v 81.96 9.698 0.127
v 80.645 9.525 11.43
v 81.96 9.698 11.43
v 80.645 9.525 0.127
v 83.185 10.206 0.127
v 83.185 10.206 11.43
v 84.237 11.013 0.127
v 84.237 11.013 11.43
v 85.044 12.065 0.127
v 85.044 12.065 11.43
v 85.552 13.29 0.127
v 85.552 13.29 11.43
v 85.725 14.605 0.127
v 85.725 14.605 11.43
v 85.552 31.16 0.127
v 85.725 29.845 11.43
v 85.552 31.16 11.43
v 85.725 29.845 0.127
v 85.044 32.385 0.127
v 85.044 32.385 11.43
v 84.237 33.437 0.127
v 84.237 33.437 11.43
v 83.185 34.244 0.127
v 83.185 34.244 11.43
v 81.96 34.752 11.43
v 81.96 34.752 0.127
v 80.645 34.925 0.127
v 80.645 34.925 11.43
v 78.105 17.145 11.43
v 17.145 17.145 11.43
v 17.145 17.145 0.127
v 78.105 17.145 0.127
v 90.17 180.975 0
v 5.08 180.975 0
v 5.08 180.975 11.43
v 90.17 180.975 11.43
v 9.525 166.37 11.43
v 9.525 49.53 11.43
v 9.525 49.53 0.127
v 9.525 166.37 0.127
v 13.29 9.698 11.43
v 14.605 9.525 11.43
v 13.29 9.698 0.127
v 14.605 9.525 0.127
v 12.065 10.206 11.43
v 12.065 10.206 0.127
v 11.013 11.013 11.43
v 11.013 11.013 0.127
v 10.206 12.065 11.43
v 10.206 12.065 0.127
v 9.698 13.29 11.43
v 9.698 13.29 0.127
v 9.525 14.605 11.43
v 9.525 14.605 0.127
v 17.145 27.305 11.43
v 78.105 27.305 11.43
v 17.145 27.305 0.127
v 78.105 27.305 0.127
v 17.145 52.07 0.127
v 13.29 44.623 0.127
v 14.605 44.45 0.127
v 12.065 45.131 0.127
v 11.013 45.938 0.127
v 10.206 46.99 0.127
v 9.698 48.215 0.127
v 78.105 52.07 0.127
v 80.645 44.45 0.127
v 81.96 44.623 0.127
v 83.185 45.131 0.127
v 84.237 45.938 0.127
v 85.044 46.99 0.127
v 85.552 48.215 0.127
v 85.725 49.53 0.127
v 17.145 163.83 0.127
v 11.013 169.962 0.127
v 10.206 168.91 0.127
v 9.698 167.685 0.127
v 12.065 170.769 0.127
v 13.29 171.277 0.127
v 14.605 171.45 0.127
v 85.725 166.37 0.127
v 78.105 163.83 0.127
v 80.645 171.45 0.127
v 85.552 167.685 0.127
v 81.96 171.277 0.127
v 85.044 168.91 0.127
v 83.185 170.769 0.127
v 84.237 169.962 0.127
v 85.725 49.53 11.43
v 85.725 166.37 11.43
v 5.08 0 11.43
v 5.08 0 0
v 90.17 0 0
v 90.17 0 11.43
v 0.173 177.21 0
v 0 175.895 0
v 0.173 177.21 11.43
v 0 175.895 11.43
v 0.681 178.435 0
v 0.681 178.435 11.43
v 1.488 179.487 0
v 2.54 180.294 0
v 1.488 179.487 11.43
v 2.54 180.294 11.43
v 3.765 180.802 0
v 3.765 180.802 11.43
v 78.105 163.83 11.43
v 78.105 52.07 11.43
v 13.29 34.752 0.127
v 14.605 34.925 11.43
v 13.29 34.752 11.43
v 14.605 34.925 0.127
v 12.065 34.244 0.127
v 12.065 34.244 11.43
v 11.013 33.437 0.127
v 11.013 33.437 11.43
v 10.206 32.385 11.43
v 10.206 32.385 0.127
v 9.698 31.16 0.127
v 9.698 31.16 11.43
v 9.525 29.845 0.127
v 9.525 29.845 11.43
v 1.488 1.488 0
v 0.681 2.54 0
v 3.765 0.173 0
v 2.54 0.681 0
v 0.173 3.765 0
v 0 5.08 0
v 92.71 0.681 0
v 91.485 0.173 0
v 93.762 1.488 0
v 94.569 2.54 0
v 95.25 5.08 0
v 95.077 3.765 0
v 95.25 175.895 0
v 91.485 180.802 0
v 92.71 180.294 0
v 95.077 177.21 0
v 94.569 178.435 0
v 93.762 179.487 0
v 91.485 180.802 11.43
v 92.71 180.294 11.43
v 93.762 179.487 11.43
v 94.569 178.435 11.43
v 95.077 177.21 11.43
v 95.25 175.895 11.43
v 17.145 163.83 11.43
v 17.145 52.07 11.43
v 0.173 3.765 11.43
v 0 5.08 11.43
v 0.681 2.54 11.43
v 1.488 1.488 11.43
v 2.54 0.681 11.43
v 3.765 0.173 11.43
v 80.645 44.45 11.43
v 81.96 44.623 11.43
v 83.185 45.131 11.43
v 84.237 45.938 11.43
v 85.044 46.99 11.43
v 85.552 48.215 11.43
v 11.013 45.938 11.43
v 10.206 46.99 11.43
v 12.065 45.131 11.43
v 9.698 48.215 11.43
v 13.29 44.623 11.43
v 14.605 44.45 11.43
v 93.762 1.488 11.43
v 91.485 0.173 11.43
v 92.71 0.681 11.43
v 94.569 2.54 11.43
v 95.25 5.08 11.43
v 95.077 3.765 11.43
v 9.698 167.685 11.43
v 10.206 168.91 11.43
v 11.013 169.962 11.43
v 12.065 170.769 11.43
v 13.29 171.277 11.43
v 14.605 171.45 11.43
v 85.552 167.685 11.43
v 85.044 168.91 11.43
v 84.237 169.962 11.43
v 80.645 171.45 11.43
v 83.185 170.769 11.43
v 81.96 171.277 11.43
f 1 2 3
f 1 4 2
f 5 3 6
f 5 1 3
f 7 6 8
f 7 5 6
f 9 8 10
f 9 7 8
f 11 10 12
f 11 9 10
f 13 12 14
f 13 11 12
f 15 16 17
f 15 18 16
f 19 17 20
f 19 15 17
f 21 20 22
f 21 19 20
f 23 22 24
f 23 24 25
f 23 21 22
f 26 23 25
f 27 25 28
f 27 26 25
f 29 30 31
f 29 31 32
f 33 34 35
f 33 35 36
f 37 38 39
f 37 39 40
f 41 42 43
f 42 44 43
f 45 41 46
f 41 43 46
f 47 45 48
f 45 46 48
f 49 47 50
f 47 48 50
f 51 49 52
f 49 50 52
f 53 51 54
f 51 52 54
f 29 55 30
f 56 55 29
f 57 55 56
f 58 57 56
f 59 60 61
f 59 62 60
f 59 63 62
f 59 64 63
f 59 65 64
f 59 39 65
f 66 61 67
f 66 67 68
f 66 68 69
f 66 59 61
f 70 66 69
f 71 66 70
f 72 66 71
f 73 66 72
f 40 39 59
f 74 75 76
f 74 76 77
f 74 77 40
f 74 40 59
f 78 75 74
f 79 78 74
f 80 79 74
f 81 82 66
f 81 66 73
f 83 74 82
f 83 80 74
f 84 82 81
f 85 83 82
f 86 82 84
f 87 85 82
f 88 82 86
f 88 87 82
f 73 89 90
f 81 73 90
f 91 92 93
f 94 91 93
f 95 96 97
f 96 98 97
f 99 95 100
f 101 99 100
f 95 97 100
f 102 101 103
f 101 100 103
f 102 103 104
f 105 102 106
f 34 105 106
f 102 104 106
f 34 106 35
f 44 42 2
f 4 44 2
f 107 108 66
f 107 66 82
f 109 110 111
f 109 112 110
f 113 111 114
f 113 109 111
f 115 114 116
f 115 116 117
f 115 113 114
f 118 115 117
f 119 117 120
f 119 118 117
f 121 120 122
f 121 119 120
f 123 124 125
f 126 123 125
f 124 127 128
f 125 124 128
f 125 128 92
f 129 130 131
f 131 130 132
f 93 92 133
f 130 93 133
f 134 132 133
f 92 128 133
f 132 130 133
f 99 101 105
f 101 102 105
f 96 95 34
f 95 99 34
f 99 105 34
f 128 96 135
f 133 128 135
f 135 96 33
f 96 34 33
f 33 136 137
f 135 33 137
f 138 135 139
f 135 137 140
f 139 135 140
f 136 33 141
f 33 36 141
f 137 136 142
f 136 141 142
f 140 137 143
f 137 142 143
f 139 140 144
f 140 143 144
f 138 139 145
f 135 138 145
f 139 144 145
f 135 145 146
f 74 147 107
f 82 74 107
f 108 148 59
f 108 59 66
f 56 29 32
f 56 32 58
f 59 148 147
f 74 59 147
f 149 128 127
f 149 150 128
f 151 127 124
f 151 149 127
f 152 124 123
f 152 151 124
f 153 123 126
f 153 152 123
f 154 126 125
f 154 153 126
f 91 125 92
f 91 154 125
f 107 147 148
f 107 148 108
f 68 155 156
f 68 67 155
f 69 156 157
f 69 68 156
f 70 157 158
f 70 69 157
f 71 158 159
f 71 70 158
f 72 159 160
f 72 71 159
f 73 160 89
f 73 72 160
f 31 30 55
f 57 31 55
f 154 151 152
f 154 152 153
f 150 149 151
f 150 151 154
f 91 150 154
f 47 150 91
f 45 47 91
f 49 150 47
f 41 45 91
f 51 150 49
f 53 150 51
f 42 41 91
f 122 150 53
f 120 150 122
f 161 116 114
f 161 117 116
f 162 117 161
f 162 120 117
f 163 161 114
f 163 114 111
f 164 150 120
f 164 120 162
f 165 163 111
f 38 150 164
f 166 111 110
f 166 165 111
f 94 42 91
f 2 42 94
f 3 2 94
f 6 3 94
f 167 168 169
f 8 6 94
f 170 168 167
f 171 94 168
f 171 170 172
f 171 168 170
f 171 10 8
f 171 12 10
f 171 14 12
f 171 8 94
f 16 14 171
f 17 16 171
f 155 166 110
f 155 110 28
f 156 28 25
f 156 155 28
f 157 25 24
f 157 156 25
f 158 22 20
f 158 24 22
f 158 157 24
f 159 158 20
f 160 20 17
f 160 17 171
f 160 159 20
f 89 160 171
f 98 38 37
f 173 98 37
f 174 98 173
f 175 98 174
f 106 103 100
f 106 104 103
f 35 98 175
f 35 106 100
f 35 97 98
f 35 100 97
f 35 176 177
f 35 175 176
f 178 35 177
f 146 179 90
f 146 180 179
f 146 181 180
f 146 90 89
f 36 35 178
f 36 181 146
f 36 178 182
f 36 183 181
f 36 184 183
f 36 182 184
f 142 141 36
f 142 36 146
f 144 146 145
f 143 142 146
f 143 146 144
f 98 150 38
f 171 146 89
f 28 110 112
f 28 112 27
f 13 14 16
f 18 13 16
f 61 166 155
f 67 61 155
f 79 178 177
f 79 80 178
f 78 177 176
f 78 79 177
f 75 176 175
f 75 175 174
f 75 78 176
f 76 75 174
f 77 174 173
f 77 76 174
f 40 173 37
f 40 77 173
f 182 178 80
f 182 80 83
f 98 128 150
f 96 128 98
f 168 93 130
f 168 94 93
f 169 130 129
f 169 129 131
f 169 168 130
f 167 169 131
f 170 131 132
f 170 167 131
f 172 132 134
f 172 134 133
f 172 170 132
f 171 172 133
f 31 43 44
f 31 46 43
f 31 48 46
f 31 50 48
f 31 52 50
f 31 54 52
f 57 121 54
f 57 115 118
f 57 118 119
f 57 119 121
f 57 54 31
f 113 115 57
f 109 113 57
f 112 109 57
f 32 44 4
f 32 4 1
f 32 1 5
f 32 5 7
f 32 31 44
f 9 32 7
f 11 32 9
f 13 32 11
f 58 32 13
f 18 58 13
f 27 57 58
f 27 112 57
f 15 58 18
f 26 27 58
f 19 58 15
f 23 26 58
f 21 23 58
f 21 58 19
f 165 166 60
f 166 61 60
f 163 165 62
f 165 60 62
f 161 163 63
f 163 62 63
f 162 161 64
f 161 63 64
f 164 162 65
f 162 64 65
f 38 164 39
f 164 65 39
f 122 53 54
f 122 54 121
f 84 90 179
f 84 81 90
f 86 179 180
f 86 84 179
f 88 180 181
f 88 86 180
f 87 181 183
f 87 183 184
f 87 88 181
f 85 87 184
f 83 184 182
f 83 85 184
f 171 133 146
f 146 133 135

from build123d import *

# Parameters (mm, degrees)
F0_W     = 95.25
F0_H     = 180.975
F1_DEPTH = 11.43
F2_W     = 76.2
F2_H     = 127
F2_W_2   = 60.96
F2_H_2   = 111.76
F2_H_3   = 25.4
F2_H_4   = 10.16
F3_DEPTH = 11.303
F4_R     = 5.08


with BuildPart() as f1:
    # F0 (on Top) → F1 (new body)
    with BuildSketch(Plane.XY):
        with Locations((47.625, 90.4875)):
            Rectangle(F0_W, F0_H)
    extrude(amount=F1_DEPTH)

    # F2 (on face) → F3 (cut)
    with BuildSketch(Plane.XY.offset(11.43)):
        with Locations((47.625, 107.95)):
            Rectangle(F2_W, F2_H)
        with Locations((47.625, 107.95)):
            Rectangle(F2_W_2, F2_H_2, mode=Mode.SUBTRACT)
        with Locations((47.625, 22.225)):
            Rectangle(F2_W, F2_H_3)
        with Locations((47.625, 22.225)):
            Rectangle(F2_W_2, F2_H_4, mode=Mode.SUBTRACT)
    extrude(amount=-F3_DEPTH, mode=Mode.SUBTRACT)

    # F4
    f4_edges = [f1.edges().sort_by_distance(p)[0] for p in [
        (0, 0, 5.715),
        (9.525, 34.925, 5.7785),
        (95.25, 0, 5.715),
        (85.725, 34.925, 5.7785),
        (9.525, 9.525, 5.7785),
        (85.725, 9.525, 5.7785),
        (85.725, 44.45, 5.7785),
        (9.525, 44.45, 5.7785),
        (0, 180.975, 5.715),
        (95.25, 180.975, 5.715),
        (85.725, 171.45, 5.7785),
        (9.525, 171.45, 5.7785),
    ]]
    fillet(f4_edges, radius=F4_R)


solid = f1.part
